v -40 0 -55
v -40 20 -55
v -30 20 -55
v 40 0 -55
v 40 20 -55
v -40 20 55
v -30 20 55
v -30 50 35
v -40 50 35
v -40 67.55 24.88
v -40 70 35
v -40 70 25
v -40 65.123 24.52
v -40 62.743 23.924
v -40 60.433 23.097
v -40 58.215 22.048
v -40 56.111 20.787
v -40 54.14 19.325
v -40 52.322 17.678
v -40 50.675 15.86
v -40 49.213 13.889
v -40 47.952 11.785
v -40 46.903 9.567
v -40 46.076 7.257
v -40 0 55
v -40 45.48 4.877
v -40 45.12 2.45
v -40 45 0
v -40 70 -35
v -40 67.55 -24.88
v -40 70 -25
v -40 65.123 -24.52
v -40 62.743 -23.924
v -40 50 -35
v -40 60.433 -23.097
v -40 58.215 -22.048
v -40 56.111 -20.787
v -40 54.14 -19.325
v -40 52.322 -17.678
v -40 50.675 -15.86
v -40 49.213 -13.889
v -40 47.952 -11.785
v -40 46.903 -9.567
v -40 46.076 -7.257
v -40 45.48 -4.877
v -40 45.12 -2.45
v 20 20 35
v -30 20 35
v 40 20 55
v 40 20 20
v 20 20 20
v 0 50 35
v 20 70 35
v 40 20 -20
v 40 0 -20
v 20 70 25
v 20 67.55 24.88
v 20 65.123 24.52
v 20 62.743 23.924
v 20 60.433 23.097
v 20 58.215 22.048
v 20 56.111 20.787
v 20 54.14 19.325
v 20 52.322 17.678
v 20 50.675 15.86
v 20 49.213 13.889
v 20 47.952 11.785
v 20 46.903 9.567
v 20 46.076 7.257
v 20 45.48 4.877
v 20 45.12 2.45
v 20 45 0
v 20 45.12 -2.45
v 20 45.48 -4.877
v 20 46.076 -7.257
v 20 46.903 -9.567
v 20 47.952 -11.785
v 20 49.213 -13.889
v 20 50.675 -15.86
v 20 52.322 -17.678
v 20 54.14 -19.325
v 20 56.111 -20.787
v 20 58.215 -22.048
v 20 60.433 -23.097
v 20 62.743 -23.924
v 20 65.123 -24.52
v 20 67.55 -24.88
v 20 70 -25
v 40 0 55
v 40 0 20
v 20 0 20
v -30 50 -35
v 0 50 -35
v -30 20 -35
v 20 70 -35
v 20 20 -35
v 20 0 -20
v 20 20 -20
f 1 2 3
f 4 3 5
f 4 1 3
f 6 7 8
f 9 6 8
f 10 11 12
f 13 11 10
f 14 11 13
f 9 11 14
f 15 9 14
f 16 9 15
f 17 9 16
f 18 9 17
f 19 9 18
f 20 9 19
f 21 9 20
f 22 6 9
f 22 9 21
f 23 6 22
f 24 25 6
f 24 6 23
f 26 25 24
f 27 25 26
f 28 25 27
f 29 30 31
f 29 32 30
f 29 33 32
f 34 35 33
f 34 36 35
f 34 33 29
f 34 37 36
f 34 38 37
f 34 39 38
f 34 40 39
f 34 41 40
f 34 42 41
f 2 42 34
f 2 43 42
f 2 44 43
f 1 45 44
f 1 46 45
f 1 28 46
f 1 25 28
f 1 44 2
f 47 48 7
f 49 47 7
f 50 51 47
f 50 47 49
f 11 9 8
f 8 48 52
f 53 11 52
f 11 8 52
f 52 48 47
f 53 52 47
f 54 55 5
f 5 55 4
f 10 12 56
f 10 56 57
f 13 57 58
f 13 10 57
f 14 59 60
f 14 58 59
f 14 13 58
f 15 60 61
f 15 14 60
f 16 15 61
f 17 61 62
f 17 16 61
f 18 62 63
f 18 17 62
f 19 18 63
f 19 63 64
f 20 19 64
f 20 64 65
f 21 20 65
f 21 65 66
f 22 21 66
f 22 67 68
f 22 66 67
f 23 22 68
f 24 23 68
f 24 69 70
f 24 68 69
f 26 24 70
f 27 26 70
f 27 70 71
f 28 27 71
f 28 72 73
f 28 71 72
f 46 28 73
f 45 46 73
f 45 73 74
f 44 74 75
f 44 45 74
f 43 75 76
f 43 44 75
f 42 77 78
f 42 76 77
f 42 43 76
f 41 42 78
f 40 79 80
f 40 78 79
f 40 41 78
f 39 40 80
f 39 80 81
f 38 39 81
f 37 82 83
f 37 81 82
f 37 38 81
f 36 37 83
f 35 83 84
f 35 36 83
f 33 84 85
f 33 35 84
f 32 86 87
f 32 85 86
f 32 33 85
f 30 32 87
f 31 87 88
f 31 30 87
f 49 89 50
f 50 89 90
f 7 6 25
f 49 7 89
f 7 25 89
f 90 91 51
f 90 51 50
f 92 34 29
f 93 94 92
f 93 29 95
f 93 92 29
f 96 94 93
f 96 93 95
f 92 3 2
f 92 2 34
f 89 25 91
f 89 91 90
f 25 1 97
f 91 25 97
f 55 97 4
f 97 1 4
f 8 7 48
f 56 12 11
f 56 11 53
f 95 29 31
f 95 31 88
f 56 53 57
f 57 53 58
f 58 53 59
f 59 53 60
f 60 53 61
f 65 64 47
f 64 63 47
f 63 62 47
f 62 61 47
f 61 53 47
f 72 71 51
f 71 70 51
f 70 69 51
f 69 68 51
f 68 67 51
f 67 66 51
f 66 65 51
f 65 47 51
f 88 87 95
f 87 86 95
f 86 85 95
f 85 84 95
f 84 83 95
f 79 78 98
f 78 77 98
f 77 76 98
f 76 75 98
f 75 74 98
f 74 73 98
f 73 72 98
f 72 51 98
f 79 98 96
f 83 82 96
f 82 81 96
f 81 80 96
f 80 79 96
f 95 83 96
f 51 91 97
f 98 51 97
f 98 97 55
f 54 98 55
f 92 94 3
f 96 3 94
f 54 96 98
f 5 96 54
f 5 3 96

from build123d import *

# Parameters (mm, degrees)
SKETCH_3_W               = 80
SKETCH_3_H               = 110
EXTRUDE_2_DEPTH          = 20
SKETCH_4_W               = 60
SKETCH_4_H               = 70
EXTRUDE_3_DEPTH          = 70
SKETCH_5_W               = 10
SKETCH_5_H               = 110
EXTRUDE_4_DEPTH          = 50
SKETCH_6_W               = 20
SKETCH_6_H               = 40
CUT_EXTRUDE_1_DEPTH      = 98.59610648
CUT_EXTRUDE_2_DEPTH      = 98.59610648
CUT_EXTRUDE_3_DEPTH      = 98.59610648
CUT_EXTRUDE_3_DEPTH_BACK = 98.59610648
SKETCH_8_R               = 25


with BuildPart() as part:
    # Эскиз3 → Бобышка-Вытянуть2 (new body)
    with BuildSketch(Plane(origin=(0, 0, 0), x_dir=(1, 0, 0), z_dir=(0, 1, 0))):
        Rectangle(SKETCH_3_W, SKETCH_3_H)
    extrude(amount=EXTRUDE_2_DEPTH)

    # Эскиз4 → Бобышка-Вытянуть3 (add)
    with BuildSketch(Plane(origin=(0, 0, 0), x_dir=(1, 0, 0), z_dir=(0, 1, 0))):
        with Locations((-10, 0)):
            Rectangle(SKETCH_4_W, SKETCH_4_H)
    extrude(amount=EXTRUDE_3_DEPTH)

    # Эскиз5 → Бобышка-Вытянуть4 (add)
    with BuildSketch(Plane(origin=(0, 0, 0), x_dir=(1, 0, 0), z_dir=(0, 1, 0))):
        with Locations((-35, 0)):
            Rectangle(SKETCH_5_W, SKETCH_5_H)
    extrude(amount=EXTRUDE_4_DEPTH)

    # Эскиз6 → Вырез-Вытянуть1 (cut, through all)
    with BuildSketch(Plane(origin=(0, 0, 0), x_dir=(1, 0, 0), z_dir=(0, 1, 0))):
        with Locations((30, 0)):
            Rectangle(SKETCH_6_W, SKETCH_6_H)
    extrude(amount=CUT_EXTRUDE_1_DEPTH, mode=Mode.SUBTRACT)

    # Эскиз7 → Вырез-Вытянуть2 (cut, through all)
    with BuildSketch(Plane(origin=(0, 0, 0), x_dir=(0, 0, -1), z_dir=(1, 0, 0))):
        Polygon((-55, 20), (-35, 50), (-55, 50), align=None)
        Polygon((55, 20), (35, 50), (55, 50), align=None)
    extrude(amount=-CUT_EXTRUDE_2_DEPTH, mode=Mode.SUBTRACT)

    # Эскиз8 → Вырез-Вытянуть3 (cut, two sides: drawn at the far end of the back side and taken through both)
    with BuildSketch(Plane(origin=(0, 0, 0), x_dir=(0, 0, -1), z_dir=(1, 0, 0)).offset(-CUT_EXTRUDE_3_DEPTH_BACK)):
        with Locations((0, 70)):
            Circle(SKETCH_8_R)
    extrude(amount=CUT_EXTRUDE_3_DEPTH + CUT_EXTRUDE_3_DEPTH_BACK, mode=Mode.SUBTRACT)


solid = part.part
